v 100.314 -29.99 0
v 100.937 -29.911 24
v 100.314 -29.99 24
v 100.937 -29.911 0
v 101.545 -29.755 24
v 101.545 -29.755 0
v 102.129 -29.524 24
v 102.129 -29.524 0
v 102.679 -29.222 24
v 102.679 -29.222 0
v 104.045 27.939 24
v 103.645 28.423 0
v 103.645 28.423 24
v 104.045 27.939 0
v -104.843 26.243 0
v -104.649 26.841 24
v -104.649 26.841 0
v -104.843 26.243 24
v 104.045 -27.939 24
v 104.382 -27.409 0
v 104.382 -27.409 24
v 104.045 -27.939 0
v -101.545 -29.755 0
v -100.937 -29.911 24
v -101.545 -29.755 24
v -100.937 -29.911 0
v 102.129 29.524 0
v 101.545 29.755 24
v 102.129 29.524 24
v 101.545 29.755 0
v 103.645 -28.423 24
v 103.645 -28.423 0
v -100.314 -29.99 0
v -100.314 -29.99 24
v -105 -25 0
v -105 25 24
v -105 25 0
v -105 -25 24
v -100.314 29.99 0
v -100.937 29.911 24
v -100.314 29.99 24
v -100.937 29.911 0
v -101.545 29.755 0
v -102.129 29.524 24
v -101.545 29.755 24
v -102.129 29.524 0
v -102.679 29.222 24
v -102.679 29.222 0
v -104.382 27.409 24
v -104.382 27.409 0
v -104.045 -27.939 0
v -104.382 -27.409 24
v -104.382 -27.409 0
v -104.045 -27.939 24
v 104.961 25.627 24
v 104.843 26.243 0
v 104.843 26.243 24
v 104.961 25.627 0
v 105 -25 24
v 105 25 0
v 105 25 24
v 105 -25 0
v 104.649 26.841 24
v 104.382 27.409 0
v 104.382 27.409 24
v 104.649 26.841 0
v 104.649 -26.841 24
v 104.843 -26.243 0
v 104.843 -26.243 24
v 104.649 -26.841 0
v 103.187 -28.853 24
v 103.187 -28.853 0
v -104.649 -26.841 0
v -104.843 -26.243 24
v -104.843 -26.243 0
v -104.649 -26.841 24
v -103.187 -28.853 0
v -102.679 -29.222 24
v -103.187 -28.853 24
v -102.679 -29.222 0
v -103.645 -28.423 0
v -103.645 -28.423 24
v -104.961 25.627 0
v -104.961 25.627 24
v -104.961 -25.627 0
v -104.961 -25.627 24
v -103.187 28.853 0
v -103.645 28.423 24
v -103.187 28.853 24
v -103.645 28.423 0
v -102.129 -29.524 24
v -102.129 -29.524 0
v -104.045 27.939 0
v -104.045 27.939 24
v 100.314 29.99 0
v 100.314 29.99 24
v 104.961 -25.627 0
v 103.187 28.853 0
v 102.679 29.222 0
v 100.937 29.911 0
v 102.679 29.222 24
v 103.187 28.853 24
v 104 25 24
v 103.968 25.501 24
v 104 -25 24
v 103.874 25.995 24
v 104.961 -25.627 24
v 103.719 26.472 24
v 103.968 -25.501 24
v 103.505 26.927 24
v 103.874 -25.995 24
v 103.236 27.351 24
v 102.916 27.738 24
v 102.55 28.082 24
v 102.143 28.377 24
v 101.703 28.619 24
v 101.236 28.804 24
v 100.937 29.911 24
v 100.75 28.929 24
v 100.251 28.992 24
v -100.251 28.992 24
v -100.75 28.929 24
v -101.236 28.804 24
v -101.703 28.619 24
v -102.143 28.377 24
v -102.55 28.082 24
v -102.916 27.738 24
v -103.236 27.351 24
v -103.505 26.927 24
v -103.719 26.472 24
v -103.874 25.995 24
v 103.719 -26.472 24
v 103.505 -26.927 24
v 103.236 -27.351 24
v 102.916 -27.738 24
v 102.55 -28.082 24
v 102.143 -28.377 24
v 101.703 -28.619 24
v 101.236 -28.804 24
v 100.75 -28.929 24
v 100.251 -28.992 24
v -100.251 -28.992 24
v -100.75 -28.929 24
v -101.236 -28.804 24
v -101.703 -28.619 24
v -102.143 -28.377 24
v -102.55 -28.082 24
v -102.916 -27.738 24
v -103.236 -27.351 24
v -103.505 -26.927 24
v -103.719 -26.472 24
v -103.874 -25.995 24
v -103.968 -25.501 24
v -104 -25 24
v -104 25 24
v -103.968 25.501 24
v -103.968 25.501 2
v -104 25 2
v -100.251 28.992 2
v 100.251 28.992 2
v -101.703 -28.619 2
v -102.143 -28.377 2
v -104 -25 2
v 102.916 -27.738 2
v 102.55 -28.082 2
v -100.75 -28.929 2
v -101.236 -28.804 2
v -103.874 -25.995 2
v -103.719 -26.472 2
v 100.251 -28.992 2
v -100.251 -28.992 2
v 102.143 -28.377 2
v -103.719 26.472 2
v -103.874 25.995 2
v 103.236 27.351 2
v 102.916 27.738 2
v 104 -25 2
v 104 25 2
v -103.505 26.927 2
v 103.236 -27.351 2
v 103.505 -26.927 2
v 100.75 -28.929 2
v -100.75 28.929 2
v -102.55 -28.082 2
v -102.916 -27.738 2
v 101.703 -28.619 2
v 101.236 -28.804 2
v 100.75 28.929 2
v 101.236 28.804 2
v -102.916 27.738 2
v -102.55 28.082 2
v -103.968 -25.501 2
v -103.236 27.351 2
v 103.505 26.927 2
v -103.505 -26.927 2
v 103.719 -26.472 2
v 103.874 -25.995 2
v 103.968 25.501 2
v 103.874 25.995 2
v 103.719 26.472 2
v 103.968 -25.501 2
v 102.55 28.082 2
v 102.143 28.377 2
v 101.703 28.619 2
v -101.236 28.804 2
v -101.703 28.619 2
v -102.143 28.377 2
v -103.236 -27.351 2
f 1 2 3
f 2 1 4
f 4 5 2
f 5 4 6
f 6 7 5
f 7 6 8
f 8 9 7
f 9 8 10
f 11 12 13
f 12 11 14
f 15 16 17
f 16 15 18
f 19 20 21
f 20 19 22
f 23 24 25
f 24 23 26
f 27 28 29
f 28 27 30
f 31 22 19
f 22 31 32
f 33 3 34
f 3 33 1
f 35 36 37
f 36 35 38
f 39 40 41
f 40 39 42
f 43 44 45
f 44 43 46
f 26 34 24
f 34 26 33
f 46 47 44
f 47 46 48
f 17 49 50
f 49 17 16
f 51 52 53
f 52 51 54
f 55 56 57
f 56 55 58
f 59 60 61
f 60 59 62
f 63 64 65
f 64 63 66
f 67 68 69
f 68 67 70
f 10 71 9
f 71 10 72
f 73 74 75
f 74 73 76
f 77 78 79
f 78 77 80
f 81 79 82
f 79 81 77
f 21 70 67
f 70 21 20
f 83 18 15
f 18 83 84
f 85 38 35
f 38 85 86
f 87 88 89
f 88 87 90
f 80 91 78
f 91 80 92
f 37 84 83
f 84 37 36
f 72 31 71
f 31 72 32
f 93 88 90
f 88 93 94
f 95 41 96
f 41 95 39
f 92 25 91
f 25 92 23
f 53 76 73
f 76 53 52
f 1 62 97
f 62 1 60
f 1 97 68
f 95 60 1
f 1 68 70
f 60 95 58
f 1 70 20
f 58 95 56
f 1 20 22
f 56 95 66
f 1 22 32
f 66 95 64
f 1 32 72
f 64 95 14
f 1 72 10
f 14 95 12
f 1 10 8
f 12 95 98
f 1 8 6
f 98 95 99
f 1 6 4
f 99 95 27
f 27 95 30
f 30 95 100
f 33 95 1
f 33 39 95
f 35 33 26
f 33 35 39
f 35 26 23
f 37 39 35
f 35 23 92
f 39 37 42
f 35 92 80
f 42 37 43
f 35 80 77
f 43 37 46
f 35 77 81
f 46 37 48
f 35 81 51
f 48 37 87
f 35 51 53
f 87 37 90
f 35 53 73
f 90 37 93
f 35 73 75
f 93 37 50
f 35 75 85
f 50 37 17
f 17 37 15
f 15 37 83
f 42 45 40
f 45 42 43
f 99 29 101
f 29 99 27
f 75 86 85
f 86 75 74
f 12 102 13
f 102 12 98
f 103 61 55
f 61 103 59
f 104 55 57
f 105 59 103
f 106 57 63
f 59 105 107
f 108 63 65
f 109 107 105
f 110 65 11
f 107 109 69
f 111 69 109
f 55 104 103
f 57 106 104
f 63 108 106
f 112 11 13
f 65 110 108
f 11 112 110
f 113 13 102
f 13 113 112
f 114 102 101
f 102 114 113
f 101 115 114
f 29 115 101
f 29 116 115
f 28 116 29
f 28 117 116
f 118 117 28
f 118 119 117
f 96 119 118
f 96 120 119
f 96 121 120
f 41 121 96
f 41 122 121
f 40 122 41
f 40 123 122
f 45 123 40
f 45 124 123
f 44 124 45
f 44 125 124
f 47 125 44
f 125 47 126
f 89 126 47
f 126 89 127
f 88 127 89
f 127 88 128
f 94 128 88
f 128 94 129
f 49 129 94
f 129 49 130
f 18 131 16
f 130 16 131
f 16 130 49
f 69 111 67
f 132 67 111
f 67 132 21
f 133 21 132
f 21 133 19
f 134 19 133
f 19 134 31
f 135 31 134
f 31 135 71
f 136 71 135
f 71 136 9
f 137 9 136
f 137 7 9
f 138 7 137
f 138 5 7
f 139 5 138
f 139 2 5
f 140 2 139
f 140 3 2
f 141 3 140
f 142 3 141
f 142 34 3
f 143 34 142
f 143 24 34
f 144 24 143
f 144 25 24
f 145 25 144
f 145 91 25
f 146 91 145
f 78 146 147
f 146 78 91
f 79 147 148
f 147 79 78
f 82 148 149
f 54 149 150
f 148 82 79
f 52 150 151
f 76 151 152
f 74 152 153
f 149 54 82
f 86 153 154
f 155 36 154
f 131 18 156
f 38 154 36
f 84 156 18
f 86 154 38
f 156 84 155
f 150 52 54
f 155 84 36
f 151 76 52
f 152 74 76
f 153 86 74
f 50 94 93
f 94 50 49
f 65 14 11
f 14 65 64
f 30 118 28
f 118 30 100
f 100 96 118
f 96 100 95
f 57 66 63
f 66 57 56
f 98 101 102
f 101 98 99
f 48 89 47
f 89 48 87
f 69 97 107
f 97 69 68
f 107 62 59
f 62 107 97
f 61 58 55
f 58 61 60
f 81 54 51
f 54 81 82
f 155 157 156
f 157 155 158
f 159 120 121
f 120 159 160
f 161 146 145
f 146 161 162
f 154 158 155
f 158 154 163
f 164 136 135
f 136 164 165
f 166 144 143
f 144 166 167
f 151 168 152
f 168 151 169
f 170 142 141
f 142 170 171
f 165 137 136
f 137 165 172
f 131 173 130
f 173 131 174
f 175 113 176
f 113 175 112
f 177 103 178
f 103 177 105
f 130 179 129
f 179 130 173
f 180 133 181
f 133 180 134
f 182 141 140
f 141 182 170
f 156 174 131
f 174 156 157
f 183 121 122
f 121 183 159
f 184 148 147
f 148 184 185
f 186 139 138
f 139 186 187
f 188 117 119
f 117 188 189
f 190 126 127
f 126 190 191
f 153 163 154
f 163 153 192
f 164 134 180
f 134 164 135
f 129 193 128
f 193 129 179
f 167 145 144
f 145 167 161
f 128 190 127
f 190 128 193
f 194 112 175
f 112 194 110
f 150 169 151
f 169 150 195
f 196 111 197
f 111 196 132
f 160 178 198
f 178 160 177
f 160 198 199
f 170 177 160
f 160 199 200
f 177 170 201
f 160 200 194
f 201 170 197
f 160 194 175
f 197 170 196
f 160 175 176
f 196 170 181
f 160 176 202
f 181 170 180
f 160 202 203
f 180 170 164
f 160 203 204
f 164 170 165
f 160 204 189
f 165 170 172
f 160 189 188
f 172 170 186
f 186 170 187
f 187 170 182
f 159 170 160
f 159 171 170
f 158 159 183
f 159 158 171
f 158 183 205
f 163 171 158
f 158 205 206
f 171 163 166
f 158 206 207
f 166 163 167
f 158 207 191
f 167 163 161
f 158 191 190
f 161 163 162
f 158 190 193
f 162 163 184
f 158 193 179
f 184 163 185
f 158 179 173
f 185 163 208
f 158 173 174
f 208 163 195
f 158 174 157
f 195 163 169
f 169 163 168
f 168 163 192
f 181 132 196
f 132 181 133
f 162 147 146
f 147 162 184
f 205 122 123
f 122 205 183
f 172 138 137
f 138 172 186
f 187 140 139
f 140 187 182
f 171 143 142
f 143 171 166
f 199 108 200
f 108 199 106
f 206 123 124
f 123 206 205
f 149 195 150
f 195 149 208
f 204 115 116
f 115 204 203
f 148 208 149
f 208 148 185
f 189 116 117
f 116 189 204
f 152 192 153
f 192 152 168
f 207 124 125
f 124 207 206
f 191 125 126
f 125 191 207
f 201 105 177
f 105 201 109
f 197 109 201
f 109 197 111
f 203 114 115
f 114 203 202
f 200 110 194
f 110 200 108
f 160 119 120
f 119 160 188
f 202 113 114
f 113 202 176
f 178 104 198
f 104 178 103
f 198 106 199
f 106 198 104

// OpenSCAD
$fn = 50;


difference() {
	union() {
		hull() {
			translate(v = [-100.0000000000, 25.0000000000, 0]) {
				cylinder(h = 24, r = 5);
			}
			translate(v = [100.0000000000, 25.0000000000, 0]) {
				cylinder(h = 24, r = 5);
			}
			translate(v = [-100.0000000000, -25.0000000000, 0]) {
				cylinder(h = 24, r = 5);
			}
			translate(v = [100.0000000000, -25.0000000000, 0]) {
				cylinder(h = 24, r = 5);
			}
		}
	}
	union() {
		translate(v = [0, 0, 2]) {
			hull() {
				translate(v = [-100.0000000000, 25.0000000000, 0]) {
					cylinder(h = 22, r = 4);
				}
				translate(v = [100.0000000000, 25.0000000000, 0]) {
					cylinder(h = 22, r = 4);
				}
				translate(v = [-100.0000000000, -25.0000000000, 0]) {
					cylinder(h = 22, r = 4);
				}
				translate(v = [100.0000000000, -25.0000000000, 0]) {
					cylinder(h = 22, r = 4);
				}
			}
		}
	}
}
